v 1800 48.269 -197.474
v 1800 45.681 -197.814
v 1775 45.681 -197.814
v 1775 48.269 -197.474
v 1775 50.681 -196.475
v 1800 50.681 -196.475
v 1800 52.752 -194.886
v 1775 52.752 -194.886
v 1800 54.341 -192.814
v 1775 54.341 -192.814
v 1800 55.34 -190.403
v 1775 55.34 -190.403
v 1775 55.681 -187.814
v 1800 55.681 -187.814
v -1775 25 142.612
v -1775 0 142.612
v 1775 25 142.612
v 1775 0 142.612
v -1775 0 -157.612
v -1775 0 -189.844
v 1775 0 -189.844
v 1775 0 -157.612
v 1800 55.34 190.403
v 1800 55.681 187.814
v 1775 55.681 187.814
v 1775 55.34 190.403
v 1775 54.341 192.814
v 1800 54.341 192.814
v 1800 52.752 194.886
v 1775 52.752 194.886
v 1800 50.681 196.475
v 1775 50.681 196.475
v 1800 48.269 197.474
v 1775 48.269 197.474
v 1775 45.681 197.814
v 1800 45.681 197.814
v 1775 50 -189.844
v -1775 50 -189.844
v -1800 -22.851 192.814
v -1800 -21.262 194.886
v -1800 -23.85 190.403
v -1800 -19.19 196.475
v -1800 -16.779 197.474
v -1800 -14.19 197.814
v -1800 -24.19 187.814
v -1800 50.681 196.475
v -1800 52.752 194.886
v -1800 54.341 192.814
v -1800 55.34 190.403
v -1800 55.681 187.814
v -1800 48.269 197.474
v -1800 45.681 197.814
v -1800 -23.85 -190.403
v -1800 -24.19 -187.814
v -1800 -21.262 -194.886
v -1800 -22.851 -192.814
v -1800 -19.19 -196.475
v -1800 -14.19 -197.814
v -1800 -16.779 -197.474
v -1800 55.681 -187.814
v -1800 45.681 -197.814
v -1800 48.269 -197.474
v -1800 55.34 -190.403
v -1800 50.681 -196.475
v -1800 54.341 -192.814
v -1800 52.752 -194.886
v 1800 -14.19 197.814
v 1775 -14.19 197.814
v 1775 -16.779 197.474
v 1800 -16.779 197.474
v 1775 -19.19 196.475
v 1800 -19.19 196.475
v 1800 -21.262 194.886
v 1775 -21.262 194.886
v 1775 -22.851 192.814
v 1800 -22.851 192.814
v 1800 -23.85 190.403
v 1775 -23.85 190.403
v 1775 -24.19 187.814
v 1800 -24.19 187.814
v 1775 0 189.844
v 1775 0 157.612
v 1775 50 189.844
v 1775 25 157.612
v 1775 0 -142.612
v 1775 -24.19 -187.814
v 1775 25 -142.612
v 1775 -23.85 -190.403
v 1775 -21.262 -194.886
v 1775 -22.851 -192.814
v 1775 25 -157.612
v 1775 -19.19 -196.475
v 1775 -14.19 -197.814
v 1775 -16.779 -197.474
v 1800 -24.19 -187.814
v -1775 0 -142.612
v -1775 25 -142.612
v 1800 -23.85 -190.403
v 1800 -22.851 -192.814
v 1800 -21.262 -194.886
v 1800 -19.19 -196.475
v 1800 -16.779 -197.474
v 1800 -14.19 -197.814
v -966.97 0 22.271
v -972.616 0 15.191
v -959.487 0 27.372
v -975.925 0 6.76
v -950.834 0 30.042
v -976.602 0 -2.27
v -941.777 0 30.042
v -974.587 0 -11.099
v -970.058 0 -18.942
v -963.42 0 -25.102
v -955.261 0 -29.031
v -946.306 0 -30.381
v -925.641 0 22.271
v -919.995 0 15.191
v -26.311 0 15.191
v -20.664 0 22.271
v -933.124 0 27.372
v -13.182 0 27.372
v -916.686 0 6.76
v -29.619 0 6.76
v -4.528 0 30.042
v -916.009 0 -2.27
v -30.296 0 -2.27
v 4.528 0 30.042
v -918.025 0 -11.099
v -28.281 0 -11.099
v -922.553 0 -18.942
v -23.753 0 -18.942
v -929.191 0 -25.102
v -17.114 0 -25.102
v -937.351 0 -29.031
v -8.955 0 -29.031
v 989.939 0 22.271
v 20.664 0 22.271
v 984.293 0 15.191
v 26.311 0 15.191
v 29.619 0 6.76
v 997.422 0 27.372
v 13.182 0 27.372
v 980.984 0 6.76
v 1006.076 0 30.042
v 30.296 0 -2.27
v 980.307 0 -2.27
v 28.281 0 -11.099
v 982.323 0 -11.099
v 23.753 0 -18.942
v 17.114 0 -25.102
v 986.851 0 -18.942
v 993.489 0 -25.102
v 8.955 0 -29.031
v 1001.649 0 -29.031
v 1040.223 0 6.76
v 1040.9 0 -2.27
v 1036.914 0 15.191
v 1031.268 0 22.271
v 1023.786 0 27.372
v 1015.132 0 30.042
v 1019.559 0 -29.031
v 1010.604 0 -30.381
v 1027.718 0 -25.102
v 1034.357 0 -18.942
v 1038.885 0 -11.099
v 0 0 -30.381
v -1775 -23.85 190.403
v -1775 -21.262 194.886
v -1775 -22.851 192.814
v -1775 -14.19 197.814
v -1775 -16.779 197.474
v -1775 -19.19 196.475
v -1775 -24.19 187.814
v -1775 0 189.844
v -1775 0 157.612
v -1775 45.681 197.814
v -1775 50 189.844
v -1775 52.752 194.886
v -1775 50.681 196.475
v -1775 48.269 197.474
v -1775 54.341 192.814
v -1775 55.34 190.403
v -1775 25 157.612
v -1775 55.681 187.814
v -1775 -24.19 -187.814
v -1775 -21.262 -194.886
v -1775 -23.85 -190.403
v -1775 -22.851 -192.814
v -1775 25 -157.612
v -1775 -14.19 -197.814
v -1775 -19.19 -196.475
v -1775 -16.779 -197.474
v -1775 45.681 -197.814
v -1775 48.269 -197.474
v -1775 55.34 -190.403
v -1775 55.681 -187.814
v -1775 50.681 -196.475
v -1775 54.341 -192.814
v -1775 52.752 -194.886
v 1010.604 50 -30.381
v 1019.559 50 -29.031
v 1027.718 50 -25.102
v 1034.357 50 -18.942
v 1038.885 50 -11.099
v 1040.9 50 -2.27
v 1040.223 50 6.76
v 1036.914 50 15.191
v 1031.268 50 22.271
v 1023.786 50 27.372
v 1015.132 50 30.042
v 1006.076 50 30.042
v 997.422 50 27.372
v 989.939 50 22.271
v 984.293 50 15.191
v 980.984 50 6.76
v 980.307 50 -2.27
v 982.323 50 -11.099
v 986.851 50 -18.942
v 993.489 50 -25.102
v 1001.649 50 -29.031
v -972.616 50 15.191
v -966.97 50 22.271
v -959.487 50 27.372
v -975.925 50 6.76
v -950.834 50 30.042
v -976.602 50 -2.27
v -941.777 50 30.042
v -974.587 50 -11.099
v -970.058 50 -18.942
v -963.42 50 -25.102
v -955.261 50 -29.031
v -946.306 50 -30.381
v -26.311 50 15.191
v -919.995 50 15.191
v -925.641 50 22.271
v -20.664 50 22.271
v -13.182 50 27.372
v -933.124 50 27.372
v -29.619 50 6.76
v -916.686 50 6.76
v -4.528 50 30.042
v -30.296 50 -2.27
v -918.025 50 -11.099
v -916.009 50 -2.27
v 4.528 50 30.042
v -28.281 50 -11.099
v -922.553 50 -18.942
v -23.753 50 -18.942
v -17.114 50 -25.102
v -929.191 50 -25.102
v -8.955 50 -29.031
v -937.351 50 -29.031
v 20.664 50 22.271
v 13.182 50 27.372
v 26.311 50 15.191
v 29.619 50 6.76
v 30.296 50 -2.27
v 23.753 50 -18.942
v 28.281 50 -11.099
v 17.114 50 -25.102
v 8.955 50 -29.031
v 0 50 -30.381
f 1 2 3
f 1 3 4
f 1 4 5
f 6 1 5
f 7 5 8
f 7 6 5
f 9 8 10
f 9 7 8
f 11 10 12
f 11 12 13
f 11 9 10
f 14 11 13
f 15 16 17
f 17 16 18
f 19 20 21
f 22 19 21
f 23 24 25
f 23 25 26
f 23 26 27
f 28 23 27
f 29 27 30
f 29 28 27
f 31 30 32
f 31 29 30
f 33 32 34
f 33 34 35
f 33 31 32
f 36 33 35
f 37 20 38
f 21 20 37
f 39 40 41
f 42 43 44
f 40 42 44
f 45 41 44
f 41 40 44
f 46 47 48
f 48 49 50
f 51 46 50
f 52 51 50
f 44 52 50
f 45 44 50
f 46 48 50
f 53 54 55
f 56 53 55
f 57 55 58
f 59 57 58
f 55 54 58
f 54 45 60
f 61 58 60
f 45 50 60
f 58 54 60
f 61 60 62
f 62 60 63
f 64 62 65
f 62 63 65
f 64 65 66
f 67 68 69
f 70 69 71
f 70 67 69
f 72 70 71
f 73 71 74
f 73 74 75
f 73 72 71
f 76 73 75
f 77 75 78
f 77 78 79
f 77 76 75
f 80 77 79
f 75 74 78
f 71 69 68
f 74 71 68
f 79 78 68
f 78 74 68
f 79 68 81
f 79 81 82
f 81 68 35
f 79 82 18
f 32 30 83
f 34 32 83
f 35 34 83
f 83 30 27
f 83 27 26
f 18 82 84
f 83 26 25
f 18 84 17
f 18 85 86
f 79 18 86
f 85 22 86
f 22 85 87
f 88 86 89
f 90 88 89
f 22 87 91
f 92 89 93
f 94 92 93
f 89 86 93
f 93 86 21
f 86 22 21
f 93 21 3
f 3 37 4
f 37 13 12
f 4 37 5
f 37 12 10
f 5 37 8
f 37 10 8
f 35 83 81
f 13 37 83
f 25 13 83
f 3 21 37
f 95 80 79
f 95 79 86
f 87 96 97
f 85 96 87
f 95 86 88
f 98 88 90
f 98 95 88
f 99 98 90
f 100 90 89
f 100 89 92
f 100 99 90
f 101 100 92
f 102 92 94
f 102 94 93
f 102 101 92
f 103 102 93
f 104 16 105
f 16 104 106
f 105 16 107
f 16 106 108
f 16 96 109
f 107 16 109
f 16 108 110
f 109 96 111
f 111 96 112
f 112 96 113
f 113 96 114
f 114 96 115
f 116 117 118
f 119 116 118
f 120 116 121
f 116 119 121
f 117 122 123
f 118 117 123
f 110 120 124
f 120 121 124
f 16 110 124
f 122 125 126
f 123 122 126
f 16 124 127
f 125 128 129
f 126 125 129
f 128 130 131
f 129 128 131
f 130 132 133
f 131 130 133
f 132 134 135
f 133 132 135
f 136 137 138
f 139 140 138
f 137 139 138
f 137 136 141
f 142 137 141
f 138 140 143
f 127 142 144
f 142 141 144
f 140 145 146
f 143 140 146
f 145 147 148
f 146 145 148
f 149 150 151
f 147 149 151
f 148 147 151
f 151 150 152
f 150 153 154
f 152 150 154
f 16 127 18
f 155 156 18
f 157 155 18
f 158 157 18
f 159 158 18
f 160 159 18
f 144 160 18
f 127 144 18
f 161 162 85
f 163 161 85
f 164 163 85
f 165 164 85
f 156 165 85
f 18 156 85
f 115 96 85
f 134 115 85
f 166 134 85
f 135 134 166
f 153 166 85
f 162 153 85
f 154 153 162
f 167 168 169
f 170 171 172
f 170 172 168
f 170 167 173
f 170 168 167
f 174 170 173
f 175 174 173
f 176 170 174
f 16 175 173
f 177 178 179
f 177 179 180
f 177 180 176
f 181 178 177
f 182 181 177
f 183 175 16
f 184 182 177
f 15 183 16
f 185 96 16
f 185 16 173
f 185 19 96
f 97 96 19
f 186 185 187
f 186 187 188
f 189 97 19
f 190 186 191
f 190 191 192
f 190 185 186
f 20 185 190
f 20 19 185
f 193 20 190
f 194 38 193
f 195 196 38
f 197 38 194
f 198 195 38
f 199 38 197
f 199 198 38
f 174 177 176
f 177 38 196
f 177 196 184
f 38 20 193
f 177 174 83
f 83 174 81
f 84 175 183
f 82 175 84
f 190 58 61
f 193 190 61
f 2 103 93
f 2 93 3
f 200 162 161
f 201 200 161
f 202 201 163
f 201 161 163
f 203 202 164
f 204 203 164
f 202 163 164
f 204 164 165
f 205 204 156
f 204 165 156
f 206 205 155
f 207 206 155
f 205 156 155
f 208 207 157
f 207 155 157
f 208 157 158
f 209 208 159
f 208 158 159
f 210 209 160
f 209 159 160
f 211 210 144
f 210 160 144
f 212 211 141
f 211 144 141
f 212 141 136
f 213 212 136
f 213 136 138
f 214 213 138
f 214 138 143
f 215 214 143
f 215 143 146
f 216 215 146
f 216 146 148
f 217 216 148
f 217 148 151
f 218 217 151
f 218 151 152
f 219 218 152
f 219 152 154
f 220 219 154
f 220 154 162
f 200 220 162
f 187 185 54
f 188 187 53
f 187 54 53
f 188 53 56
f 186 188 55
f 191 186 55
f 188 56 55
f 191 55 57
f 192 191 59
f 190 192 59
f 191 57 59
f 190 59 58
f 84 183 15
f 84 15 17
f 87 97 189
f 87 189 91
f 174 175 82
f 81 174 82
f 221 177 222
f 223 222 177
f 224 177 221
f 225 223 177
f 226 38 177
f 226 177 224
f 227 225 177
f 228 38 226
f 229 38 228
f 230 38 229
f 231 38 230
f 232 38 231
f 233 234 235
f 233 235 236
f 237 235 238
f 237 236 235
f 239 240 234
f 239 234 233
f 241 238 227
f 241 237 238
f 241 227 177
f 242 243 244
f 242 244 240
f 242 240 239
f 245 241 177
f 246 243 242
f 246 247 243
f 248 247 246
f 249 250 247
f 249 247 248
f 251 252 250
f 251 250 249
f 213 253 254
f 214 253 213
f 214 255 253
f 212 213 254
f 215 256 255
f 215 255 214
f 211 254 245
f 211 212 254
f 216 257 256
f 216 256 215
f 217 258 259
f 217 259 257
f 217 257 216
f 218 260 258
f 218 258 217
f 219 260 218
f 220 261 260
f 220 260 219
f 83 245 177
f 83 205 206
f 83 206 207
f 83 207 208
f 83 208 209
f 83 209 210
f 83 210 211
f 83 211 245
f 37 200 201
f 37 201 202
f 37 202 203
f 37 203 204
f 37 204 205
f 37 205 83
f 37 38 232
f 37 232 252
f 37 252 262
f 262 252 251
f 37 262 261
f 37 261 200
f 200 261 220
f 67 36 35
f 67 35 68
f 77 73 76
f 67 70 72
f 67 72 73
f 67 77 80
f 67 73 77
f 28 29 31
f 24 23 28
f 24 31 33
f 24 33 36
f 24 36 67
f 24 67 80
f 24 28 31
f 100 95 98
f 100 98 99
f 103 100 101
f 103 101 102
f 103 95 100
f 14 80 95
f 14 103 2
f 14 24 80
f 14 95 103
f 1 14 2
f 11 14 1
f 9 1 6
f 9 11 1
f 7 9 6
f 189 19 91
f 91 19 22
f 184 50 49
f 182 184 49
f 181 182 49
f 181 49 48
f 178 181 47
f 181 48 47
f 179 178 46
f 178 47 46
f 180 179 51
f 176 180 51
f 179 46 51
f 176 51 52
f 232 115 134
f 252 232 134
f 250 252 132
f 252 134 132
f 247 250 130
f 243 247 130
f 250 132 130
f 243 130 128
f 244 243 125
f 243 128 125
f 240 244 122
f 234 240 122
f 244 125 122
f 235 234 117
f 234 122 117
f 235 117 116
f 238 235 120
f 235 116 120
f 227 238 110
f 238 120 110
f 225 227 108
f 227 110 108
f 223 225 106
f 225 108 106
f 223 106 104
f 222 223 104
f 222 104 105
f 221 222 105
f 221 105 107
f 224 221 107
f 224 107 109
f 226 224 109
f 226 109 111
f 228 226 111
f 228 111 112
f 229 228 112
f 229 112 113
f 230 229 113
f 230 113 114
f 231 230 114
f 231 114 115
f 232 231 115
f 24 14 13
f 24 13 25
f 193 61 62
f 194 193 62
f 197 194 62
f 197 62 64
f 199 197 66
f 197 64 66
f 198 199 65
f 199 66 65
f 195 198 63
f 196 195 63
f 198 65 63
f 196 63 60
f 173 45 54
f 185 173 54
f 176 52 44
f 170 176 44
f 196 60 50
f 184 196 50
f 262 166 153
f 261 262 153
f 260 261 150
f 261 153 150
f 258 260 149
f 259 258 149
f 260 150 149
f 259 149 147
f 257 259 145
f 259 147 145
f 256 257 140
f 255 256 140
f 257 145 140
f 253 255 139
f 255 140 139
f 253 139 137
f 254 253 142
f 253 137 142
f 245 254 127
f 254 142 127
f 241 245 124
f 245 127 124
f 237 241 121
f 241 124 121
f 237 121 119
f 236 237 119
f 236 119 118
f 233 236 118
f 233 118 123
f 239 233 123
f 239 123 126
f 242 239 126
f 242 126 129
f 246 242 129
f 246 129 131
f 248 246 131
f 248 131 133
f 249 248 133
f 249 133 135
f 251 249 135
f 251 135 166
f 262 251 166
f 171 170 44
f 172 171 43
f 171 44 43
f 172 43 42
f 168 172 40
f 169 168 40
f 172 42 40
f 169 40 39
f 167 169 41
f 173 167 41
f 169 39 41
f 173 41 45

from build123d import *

# Parameters (mm, degrees)
SKETCH1_W           = 3600
SKETCH1_H           = 379.6875
BOSS_EXTRUDE1_DEPTH = 50
SKETCH2_W           = 3653.851372928
SKETCH2_H           = 15
CUT_EXTRUDE1_DEPTH  = 25
SKETCH3_R           = 30.381139082
CUT_EXTRUDE2_DEPTH  = 1811.674087022
BOSS_EXTRUDE2_DEPTH = 25


with BuildPart() as part:
    # Sketch1 → Boss-Extrude1 (new body)
    with BuildSketch(Plane(origin=(0, 0, 0), x_dir=(1, 0, 0), z_dir=(0, 1, 0))):
        Rectangle(SKETCH1_W, SKETCH1_H)
    extrude(amount=BOSS_EXTRUDE1_DEPTH)

    # Sketch2 → Cut-Extrude1 (cut)
    with BuildSketch(Plane.XZ):
        with Locations((26.925686464, 150.111800851)):
            Rectangle(SKETCH2_W, SKETCH2_H)
        with Locations((26.925686464, -150.111800851)):
            Rectangle(SKETCH2_W, SKETCH2_H)
    extrude(amount=-CUT_EXTRUDE1_DEPTH, mode=Mode.SUBTRACT)

    # Sketch3 → Cut-Extrude2 (cut, through all)
    with BuildSketch(Plane.XZ):
        with Locations(Location((0, 0, 0), (0, 0, 270))):
            Circle(SKETCH3_R)
        with Locations(Location((-946.305515807, 0, 0), (0, 0, 270))):
            Circle(SKETCH3_R)
        with Locations(Location((1010.603651897, 0, 0), (0, 0, 270))):
            Circle(SKETCH3_R)
    extrude(amount=-CUT_EXTRUDE2_DEPTH, mode=Mode.SUBTRACT)

    # Sketch4 → Boss-Extrude2 (add)
    with BuildSketch(Plane(origin=(1800, 0, 0), x_dir=(0, 0, -1), z_dir=(1, 0, 0))):
        with BuildLine():
            Line((-187.814440115, -24.190456177), (187.814440115, -24.190456177))
            ThreePointArc((187.814440115, -24.190456177), (194.885507927, -21.261523989), (197.814440115, -14.190456177))
            Line((197.814440115, -14.190456177), (197.814440115, 45.681163873))
            ThreePointArc((197.814440115, 45.681163873), (194.885507927, 52.752231685), (187.814440115, 55.681163873))
            Line((187.814440115, 55.681163873), (-187.814440115, 55.681163873))
            ThreePointArc((-187.814440115, 55.681163873), (-194.885507927, 52.752231685), (-197.814440115, 45.681163873))
            Line((-197.814440115, 45.681163873), (-197.814440115, -14.190456177))
            ThreePointArc((-197.814440115, -14.190456177), (-194.885507927, -21.261523989), (-187.814440115, -24.190456177))
        make_face()
    boss_extrude2 = extrude(amount=-BOSS_EXTRUDE2_DEPTH)

    # Mirror1: Boss-Extrude2 across plane
    add(boss_extrude2.mirror(Plane(origin=(0, 0, 0), x_dir=(0, 0, 1), z_dir=(1, 0, 0))))


solid = part.part
